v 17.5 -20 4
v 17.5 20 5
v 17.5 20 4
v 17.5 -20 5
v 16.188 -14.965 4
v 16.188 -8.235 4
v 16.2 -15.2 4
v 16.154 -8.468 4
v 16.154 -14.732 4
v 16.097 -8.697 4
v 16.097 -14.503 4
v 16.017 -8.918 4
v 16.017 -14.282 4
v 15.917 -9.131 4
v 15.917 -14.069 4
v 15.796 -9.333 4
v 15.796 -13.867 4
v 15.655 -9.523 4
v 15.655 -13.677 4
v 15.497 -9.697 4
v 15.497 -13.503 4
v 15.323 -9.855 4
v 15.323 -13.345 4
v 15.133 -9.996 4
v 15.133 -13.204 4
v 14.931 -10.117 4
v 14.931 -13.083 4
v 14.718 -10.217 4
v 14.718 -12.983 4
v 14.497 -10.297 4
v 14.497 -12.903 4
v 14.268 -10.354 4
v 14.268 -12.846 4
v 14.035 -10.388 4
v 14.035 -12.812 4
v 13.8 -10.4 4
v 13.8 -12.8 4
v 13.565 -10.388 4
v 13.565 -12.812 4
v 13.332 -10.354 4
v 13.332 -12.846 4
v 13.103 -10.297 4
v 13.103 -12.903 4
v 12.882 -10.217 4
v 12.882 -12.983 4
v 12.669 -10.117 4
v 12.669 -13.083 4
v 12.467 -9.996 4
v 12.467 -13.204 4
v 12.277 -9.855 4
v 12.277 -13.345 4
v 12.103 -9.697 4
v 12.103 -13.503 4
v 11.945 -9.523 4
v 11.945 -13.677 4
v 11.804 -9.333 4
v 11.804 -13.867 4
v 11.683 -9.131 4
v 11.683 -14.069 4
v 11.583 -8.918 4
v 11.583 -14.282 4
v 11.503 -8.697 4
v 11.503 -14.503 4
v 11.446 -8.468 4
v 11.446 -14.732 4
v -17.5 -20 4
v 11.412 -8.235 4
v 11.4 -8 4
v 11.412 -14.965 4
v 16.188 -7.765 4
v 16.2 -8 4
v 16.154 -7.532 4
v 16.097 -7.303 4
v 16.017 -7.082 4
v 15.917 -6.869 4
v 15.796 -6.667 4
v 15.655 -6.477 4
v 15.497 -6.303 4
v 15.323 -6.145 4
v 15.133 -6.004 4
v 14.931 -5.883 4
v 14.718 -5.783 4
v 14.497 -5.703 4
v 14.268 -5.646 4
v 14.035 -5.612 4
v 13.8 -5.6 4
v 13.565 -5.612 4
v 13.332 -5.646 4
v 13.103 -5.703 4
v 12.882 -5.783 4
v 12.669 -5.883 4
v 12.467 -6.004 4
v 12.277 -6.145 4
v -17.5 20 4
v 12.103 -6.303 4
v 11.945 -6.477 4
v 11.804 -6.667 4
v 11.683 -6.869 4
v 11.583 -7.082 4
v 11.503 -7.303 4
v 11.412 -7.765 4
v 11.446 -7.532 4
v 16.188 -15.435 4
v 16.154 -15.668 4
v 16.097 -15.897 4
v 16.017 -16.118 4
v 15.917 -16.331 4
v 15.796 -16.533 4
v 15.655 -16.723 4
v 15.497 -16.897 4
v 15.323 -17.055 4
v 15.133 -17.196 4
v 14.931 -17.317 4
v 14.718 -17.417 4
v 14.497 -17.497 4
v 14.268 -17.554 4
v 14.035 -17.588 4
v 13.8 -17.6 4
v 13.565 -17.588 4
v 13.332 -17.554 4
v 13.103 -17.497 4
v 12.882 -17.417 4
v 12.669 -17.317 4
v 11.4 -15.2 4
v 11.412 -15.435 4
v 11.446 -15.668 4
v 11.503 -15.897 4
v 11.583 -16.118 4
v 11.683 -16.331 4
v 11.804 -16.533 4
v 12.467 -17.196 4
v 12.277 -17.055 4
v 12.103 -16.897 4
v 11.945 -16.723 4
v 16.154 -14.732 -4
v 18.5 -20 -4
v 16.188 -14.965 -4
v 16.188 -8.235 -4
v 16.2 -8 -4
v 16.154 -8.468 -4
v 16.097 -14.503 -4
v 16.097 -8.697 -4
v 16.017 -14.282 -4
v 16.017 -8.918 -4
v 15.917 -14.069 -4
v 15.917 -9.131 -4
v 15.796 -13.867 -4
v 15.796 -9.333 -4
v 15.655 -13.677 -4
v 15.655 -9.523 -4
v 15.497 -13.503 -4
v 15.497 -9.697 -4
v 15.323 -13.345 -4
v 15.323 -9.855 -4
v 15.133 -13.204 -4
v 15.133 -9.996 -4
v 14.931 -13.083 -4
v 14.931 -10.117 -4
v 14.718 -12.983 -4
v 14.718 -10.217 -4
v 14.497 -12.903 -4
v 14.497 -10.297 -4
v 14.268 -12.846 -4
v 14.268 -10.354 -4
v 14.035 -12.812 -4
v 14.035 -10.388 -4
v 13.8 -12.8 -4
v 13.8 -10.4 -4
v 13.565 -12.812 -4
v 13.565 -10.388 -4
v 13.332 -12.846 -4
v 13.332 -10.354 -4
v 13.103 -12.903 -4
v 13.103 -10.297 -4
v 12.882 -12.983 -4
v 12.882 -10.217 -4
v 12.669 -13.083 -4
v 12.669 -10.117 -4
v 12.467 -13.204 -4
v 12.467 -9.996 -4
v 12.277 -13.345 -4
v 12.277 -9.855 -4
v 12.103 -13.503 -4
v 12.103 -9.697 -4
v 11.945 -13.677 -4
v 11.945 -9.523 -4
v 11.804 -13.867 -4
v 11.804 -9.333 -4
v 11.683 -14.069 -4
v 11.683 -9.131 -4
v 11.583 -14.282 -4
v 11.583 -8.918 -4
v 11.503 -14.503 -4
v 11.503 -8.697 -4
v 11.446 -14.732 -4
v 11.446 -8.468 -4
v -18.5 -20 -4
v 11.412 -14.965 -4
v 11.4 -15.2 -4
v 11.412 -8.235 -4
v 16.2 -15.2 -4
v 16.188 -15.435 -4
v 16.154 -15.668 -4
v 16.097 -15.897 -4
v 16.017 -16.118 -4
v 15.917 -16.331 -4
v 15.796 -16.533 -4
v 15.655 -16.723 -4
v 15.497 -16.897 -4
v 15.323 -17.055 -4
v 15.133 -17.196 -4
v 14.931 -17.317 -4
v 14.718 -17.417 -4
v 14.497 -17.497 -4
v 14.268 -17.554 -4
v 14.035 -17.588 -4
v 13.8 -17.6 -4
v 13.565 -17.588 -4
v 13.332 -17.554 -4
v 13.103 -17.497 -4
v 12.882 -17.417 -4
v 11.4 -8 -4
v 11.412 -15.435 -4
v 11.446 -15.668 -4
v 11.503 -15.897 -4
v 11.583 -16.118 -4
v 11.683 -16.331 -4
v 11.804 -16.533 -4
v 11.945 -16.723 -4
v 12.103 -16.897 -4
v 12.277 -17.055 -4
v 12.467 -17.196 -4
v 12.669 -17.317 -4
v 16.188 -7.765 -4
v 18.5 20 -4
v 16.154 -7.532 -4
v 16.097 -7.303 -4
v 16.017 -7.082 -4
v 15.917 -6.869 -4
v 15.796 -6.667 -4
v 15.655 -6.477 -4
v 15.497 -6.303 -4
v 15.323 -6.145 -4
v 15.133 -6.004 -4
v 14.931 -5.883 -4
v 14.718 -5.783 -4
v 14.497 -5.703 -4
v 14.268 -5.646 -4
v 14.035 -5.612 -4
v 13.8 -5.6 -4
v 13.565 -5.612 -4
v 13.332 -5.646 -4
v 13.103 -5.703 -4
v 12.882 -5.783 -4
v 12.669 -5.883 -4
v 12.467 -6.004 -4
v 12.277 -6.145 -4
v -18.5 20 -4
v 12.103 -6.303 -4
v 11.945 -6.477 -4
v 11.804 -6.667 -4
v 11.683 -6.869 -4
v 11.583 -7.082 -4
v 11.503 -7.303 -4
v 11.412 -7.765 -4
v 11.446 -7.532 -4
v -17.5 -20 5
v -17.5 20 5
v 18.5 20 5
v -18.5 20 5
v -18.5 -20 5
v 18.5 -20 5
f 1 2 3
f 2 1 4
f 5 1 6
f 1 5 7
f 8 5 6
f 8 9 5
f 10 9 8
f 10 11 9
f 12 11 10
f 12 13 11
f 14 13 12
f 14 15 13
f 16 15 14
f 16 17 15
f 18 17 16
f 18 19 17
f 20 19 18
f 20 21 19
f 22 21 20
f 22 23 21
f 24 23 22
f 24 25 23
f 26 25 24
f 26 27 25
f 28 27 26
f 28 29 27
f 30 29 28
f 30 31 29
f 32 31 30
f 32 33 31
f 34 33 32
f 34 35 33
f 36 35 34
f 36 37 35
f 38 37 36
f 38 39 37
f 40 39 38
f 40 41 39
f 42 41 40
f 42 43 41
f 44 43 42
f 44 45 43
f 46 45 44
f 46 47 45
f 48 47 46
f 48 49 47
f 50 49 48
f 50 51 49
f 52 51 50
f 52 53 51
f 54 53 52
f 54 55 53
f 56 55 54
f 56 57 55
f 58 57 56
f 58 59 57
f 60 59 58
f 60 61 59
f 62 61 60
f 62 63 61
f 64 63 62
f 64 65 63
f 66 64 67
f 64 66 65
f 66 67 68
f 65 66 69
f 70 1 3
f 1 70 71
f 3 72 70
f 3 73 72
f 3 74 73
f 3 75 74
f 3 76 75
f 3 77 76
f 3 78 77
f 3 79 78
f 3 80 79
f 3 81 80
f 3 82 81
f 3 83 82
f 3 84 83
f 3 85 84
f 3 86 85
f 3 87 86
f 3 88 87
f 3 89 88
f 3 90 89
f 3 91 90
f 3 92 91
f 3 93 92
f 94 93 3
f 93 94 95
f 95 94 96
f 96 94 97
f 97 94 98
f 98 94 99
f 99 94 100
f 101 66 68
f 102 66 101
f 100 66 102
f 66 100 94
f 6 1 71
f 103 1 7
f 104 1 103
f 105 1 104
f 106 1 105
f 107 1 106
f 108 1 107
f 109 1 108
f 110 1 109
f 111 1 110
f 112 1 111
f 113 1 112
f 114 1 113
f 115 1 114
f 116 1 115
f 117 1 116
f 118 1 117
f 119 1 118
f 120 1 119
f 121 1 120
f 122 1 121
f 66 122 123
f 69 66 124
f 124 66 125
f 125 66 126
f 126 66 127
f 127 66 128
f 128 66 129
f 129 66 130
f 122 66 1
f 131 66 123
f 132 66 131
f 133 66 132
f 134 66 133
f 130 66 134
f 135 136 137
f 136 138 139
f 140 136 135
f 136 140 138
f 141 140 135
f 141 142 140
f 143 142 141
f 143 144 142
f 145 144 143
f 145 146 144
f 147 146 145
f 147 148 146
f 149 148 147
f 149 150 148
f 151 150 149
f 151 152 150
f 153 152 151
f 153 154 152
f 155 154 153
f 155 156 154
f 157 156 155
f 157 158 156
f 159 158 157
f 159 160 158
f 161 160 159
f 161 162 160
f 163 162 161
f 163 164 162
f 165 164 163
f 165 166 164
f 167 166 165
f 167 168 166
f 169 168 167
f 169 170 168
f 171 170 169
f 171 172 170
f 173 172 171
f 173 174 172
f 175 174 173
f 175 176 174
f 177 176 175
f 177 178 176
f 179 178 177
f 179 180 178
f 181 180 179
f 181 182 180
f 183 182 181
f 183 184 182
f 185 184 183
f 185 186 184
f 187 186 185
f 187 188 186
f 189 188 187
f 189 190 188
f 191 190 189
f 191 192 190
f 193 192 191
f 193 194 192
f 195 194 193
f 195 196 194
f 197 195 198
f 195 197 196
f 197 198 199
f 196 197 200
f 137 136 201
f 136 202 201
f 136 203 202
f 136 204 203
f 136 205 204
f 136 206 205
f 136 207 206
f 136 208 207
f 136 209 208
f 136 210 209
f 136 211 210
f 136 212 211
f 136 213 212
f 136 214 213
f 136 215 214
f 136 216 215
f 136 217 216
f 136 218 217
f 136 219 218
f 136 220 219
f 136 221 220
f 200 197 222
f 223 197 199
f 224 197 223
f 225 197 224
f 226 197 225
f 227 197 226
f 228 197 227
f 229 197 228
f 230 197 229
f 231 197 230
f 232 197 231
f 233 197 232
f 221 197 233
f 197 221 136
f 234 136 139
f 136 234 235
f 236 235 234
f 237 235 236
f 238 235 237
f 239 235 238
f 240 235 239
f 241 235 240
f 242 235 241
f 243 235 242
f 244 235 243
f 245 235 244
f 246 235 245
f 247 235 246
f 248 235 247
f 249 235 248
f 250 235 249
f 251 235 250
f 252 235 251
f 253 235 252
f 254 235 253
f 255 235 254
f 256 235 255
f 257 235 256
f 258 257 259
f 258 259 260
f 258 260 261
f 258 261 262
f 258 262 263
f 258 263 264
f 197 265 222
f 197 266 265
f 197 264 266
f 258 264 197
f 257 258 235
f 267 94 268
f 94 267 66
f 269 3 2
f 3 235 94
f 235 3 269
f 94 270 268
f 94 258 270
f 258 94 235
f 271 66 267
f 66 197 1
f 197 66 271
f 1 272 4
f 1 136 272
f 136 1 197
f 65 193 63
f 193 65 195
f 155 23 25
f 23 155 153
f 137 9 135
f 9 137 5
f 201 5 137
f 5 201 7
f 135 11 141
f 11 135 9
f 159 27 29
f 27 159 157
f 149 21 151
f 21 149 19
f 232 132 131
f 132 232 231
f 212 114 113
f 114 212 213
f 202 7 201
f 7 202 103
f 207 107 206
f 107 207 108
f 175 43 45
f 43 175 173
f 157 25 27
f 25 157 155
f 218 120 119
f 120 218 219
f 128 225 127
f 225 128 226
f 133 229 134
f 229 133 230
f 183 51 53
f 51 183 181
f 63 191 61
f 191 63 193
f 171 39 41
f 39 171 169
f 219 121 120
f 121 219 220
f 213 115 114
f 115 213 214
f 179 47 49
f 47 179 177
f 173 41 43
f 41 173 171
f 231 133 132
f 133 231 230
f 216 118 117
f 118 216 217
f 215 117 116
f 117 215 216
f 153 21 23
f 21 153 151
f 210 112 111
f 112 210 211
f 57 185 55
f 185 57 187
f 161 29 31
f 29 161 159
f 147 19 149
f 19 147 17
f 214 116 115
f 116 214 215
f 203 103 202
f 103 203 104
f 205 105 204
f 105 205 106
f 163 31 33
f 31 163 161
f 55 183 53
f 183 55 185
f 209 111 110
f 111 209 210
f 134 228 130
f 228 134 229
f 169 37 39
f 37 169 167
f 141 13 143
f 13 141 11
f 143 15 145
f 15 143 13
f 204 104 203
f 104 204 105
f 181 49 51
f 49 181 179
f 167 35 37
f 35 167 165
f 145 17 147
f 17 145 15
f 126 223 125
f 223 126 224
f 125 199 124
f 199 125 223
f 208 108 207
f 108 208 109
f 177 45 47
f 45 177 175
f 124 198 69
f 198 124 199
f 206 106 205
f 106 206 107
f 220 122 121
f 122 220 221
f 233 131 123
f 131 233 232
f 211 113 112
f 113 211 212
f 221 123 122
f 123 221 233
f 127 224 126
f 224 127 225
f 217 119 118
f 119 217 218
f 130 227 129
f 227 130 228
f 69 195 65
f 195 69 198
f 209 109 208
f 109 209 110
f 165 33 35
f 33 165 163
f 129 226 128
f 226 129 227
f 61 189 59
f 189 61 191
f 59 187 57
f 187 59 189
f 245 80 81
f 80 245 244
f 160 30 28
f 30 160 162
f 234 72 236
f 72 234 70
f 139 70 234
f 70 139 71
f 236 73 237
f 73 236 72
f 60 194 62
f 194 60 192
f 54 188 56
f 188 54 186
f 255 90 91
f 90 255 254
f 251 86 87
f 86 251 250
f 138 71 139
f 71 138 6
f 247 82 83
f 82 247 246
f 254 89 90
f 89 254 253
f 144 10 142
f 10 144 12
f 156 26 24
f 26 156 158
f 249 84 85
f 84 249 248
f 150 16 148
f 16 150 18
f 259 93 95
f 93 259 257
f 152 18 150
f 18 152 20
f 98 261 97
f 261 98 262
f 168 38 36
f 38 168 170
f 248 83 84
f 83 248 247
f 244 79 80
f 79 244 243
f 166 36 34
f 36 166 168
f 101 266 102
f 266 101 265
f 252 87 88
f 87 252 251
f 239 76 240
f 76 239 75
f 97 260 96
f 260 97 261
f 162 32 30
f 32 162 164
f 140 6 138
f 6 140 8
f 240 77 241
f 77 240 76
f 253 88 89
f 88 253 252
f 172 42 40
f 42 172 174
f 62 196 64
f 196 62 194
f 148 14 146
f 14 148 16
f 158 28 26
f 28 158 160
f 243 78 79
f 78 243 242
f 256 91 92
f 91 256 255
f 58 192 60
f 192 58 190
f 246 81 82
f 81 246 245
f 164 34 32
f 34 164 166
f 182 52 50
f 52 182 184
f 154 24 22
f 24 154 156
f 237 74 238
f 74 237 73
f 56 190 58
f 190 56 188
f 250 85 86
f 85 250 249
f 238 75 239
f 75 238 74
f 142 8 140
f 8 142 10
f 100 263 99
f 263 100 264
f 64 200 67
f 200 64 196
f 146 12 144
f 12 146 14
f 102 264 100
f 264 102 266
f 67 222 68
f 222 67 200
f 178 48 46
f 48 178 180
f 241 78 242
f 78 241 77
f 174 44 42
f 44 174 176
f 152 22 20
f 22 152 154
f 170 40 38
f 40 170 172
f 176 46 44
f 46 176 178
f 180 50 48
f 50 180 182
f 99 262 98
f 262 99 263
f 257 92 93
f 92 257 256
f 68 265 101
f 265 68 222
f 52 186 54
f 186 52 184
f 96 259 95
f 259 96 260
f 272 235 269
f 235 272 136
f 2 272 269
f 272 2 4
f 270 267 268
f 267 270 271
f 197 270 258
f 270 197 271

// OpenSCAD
railX=35;
railY=40;
railZ=8;
holeD=4.8;
holeX=railX/2-3.7;
hole1Y=-railY/2+4.8;
hole2Y=-railY/2+(4.5+7.5);
frameThickness=1;

difference() {
    cube([railX,railY,railZ],center=true);
    translate([holeX,hole1Y,0])cylinder(d=holeD,h=railZ,$fn=64,center=true);
    translate([holeX,hole2Y,0])cylinder(d=holeD,h=railZ,$fn=64,center=true);
}

//Frame
translate([railX/2+frameThickness/2,0,frameThickness/2])cube([frameThickness,railY,railZ+frameThickness],center=true);
translate([-railX/2-frameThickness/2,0,frameThickness/2])cube([frameThickness,railY,railZ+frameThickness],center=true);
